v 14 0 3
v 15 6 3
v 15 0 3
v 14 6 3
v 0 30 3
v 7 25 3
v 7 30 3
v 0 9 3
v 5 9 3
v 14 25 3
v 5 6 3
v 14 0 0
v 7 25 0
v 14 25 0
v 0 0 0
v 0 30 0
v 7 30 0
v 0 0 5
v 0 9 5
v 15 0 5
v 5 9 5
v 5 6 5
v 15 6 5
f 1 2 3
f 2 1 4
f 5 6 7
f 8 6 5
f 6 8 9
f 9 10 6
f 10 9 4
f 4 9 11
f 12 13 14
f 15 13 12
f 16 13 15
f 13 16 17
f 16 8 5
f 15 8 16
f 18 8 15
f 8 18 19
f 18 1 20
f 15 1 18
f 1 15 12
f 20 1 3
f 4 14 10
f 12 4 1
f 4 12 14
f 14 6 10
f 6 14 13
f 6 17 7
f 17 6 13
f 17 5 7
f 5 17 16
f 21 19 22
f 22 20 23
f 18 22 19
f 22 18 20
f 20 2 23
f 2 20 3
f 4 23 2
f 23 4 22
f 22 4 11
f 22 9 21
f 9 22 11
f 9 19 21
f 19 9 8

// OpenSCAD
translate([3.5, 2.5, 1.5]) color([0.036392037611485795, 0.021636509855024078, 0.9610312802396112]) cube([7, 5, 3], center=true);
translate([10.5, 2.5, 1.5]) color([0.18497194139743833, 0.12389516442443171, 0.21057650988664645]) cube([7, 5, 3], center=true);
translate([3.5, 7.5, 1.5]) color([0.8007465903541809, 0.9369691586445807, 0.022782575668658378]) cube([7, 5, 3], center=true);
translate([10.5, 7.5, 1.5]) color([0.42561883196681716, 0.10150021937416975, 0.259919889792832]) cube([7, 5, 3], center=true);
translate([3.5, 12.5, 1.5]) color([0.22082927131631735, 0.6469257198353225, 0.3502939673965323]) cube([7, 5, 3], center=true);
translate([10.5, 12.5, 1.5]) color([0.18031790152968785, 0.5036365052098872, 0.03937870708469238]) cube([7, 5, 3], center=true);
translate([3.5, 17.5, 1.5]) color([0.10092124118896661, 0.9882351487225011, 0.19935579046706298]) cube([7, 5, 3], center=true);
translate([10.5, 17.5, 1.5]) color([0.35855530131160185, 0.7315983062253606, 0.8383265651934163]) cube([7, 5, 3], center=true);
translate([3.5, 22.5, 1.5]) color([0.9184820619953314, 0.16942460609746768, 0.6726405635730526]) cube([7, 5, 3], center=true);
translate([10.5, 22.5, 1.5]) color([0.9665489030431832, 0.05805094382649867, 0.6762017842993783]) cube([7, 5, 3], center=true);
translate([3.5, 27.5, 1.5]) color([0.8454245937016164, 0.342312541078584, 0.25068733928511167]) cube([7, 5, 3], center=true);
translate([2.5, 1.5, 4.0]) color([0.596791393469411, 0.44231403369907896, 0.17481948445144113]) cube([5, 3, 2], center=true);
translate([7.5, 1.5, 4.0]) color([0.47162541509628797, 0.40990539565755457, 0.5691127395242802]) cube([5, 3, 2], center=true);
translate([12.5, 1.5, 4.0]) color([0.5086001300626332, 0.3114460010002068, 0.35715168259026286]) cube([5, 3, 2], center=true);
translate([2.5, 4.5, 4.0]) color([0.837661174368979, 0.25093266482213705, 0.560600218853524]) cube([5, 3, 2], center=true);
translate([7.5, 4.5, 4.0]) color([0.012436318829314397, 0.7415743774106636, 0.3359165544734606]) cube([5, 3, 2], center=true);
translate([12.5, 4.5, 4.0]) color([0.04569649356841665, 0.28088316421834825, 0.24013040782635398]) cube([5, 3, 2], center=true);
translate([2.5, 7.5, 4.0]) color([0.9531293398277989, 0.35222556151550743, 0.2878779148564]) cube([5, 3, 2], center=true);
